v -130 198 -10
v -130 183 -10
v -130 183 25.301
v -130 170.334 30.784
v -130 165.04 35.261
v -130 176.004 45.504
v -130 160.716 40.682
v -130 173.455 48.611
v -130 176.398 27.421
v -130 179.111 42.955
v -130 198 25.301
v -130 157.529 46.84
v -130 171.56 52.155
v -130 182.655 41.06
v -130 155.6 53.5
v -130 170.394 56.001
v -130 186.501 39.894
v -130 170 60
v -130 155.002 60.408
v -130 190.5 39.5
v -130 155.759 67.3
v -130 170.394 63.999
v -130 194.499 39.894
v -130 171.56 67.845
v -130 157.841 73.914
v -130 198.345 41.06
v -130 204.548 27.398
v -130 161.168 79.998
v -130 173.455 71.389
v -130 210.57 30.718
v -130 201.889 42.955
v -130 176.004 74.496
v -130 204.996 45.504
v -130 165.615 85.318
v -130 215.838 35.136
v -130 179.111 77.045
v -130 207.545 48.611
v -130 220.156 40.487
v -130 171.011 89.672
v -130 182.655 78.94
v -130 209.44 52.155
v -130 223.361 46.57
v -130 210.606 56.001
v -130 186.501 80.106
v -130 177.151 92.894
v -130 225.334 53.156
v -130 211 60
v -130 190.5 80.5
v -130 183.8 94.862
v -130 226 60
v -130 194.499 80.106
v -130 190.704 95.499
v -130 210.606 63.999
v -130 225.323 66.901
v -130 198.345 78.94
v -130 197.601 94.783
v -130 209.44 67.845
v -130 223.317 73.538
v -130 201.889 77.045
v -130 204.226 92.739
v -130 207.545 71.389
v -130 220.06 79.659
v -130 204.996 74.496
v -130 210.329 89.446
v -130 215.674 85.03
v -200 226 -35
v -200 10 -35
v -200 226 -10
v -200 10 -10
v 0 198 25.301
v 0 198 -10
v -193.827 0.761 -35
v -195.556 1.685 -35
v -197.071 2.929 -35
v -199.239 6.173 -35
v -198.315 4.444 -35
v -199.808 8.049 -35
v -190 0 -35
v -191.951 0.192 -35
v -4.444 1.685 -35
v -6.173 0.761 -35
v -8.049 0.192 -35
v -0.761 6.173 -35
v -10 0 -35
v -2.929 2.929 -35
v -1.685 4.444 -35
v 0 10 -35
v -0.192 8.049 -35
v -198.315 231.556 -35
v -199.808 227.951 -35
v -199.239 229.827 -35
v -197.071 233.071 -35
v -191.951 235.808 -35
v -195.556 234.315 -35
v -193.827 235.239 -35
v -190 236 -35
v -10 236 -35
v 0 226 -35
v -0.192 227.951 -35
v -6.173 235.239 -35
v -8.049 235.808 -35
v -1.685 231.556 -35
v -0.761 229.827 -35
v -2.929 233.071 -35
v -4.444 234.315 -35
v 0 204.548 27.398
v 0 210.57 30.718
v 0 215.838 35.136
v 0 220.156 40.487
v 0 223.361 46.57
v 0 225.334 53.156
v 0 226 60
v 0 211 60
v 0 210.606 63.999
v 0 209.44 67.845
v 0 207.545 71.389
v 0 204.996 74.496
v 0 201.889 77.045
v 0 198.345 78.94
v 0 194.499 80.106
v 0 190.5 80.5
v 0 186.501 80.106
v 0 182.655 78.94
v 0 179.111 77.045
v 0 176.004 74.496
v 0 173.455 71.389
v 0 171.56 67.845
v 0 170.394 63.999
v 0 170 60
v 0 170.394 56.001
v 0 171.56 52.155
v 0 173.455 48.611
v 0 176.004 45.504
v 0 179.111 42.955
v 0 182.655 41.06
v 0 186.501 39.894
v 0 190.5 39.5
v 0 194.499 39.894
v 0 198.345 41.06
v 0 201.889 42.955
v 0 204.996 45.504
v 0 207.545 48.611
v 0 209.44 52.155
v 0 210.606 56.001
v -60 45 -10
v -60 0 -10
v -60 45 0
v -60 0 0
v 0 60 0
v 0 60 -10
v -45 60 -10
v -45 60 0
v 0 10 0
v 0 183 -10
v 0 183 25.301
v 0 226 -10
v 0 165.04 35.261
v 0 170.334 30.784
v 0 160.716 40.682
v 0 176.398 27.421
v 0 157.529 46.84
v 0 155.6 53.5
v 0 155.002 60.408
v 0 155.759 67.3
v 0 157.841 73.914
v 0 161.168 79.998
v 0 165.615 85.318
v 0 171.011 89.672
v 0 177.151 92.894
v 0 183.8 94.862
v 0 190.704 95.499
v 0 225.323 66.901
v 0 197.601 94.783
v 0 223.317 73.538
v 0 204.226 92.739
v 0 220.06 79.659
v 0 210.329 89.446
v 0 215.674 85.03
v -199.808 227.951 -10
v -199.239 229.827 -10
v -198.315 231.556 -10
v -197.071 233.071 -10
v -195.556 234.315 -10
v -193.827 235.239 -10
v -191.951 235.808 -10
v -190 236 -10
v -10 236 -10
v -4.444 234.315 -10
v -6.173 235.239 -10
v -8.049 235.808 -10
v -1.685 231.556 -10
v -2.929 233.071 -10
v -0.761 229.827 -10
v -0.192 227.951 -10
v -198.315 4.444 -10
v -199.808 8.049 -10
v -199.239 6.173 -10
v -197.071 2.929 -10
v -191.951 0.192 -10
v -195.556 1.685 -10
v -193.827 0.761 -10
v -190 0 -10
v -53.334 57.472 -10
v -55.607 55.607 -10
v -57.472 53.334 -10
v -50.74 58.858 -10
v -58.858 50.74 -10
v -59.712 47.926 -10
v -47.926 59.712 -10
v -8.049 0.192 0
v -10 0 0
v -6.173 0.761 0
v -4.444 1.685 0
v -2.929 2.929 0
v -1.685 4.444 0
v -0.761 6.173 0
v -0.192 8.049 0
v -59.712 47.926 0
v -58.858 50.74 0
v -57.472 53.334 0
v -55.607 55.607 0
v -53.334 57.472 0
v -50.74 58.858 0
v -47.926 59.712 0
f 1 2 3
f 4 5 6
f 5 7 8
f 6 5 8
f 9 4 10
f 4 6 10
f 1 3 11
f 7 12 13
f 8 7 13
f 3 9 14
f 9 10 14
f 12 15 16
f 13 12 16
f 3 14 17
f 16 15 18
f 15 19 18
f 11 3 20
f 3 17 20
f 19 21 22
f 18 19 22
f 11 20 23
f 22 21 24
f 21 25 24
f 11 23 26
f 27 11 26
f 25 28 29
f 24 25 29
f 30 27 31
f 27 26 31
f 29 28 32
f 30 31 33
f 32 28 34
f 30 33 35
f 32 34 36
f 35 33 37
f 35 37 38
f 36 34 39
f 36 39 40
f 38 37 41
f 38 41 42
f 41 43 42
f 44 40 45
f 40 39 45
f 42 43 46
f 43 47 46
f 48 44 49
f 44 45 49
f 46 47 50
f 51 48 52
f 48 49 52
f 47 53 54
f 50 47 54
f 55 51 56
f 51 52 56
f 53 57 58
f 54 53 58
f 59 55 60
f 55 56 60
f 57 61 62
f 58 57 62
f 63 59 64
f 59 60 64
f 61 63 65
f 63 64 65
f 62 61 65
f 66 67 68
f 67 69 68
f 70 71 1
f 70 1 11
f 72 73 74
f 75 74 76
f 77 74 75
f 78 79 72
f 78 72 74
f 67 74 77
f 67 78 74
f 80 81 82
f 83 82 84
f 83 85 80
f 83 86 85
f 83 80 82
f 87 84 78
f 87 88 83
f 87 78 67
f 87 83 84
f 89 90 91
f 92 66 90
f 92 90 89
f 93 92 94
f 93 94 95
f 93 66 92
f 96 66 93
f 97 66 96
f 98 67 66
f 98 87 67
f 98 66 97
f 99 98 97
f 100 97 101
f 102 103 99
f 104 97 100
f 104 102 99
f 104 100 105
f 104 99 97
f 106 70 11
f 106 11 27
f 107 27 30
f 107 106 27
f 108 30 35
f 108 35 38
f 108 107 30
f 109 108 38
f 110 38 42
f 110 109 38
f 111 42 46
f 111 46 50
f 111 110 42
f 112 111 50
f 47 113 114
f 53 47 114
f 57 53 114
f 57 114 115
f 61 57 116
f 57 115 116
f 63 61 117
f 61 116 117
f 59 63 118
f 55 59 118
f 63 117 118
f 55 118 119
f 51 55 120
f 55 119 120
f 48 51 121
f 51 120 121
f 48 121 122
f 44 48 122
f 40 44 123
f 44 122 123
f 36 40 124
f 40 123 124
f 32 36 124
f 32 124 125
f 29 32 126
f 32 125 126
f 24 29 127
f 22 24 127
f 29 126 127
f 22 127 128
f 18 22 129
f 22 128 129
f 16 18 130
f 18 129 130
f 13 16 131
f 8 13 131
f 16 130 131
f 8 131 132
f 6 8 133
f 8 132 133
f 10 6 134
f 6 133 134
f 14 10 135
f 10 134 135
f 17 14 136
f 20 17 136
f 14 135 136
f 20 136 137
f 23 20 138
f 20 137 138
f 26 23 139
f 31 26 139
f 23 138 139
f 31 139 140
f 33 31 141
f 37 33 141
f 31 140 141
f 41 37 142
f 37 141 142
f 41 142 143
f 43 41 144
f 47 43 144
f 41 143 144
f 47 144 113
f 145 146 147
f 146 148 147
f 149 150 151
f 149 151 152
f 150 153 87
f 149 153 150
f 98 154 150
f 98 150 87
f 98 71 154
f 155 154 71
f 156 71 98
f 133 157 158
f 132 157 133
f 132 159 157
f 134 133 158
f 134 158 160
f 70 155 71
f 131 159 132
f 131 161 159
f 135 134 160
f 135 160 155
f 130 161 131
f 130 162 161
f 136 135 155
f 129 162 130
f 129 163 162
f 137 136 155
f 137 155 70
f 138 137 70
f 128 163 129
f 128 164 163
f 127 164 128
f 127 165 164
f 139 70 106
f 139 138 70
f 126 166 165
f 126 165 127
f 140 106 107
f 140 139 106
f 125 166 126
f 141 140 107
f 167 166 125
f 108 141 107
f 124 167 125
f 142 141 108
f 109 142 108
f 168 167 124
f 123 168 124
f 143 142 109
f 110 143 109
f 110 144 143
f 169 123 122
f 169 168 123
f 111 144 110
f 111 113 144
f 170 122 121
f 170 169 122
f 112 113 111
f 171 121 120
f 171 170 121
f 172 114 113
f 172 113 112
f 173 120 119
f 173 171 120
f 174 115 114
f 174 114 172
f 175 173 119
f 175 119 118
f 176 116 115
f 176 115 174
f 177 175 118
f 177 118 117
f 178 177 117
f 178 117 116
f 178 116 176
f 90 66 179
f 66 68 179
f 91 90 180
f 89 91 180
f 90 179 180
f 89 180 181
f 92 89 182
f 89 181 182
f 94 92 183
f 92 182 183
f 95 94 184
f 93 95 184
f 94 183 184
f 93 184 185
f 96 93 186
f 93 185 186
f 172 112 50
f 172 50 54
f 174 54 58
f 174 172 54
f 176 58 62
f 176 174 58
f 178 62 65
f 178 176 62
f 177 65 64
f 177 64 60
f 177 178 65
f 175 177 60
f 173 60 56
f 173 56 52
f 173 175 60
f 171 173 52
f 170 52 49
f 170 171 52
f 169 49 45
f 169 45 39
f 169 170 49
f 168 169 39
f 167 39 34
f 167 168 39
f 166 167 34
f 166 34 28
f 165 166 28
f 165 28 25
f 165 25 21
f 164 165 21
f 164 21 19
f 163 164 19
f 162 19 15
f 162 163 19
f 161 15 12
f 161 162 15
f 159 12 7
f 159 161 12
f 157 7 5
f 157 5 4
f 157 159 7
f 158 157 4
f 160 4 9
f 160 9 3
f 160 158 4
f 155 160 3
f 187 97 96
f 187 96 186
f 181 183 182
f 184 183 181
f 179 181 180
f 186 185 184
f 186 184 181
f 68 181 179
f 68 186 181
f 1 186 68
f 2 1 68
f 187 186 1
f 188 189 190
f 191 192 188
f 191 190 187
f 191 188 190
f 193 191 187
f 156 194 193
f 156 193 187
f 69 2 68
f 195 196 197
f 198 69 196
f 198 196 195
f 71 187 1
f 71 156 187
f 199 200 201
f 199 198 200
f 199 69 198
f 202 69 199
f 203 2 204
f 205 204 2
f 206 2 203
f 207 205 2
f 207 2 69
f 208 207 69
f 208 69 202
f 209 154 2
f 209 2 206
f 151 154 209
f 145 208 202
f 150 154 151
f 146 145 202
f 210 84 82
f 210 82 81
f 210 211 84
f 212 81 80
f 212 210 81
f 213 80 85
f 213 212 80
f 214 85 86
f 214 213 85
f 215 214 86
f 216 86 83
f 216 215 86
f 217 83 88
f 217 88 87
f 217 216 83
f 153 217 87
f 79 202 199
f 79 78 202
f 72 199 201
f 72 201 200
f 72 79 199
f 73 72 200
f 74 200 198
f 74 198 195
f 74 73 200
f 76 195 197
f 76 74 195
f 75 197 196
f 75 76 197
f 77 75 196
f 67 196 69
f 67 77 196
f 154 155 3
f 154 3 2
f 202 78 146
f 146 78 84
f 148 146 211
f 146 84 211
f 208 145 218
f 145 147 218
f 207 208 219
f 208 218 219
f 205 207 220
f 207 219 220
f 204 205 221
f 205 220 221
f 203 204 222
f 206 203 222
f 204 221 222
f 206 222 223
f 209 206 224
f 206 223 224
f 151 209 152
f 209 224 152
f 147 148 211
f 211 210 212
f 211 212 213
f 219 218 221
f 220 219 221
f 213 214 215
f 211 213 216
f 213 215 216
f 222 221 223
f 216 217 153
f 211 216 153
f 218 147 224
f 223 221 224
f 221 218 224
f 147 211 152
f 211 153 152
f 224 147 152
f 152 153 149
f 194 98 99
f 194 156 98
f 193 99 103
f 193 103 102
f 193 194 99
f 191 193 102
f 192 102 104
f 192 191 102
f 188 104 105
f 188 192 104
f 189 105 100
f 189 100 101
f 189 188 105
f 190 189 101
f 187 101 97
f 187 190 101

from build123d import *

# Parameters (mm, degrees)
F1_DEPTH = 200
F0_W     = 60
F0_H     = 10
F2_DEPTH = 60
F0_R     = 20.5
F3_DEPTH = 130
F4_R     = 10
F5_R     = 15


with BuildPart() as f1:
    # F0 (on Right) → F1 (new body)
    with BuildSketch(Plane.YZ):
        Polygon((60, -10), (0, -10), (0, -35), (236, -35), (236, -10), (198, -10), (183, -10), align=None)
    extrude(amount=-F1_DEPTH)

    # F0 (on Right) → F2 (join)
    with BuildSketch(Plane.YZ):
        with Locations((30, -5)):
            Rectangle(F0_W, F0_H)
    extrude(amount=-F2_DEPTH)

    # F0 (on Right) → F3 (join)
    with BuildSketch(Plane.YZ):
        with BuildLine():
            ThreePointArc((226, 60), (168.206503, 87.62698), (183, 25.301297))
            ThreePointArc((183, 25.301297), (190.5, 24.5), (198, 25.301297))
            ThreePointArc((198, 25.301297), (218.12698, 37.706503), (226, 60))
        make_face()
        with Locations((190.5, 60)):
            Circle(F0_R, mode=Mode.SUBTRACT)
        with BuildLine():
            Line((183, 25.301297), (183, -10))
            Line((183, -10), (198, -10))
            Line((198, -10), (198, 25.301297))
            ThreePointArc((198, 25.301297), (190.5, 24.5), (183, 25.301297))
        make_face()
    extrude(amount=-F3_DEPTH)

    # F4
    f4_edges = [f1.edges().sort_by_distance(p)[0] for p in [
        (0, 0, -17.5),
        (-200, 0, -22.5),
        (0, 236, -22.5),
        (-200, 236, -22.5),
    ]]
    fillet(f4_edges, radius=F4_R)

    # F5
    f5_edges = [f1.edges().sort_by_distance(p)[0] for p in [
        (-60, 60, -5),
    ]]
    fillet(f5_edges, radius=F5_R)


solid = f1.part
